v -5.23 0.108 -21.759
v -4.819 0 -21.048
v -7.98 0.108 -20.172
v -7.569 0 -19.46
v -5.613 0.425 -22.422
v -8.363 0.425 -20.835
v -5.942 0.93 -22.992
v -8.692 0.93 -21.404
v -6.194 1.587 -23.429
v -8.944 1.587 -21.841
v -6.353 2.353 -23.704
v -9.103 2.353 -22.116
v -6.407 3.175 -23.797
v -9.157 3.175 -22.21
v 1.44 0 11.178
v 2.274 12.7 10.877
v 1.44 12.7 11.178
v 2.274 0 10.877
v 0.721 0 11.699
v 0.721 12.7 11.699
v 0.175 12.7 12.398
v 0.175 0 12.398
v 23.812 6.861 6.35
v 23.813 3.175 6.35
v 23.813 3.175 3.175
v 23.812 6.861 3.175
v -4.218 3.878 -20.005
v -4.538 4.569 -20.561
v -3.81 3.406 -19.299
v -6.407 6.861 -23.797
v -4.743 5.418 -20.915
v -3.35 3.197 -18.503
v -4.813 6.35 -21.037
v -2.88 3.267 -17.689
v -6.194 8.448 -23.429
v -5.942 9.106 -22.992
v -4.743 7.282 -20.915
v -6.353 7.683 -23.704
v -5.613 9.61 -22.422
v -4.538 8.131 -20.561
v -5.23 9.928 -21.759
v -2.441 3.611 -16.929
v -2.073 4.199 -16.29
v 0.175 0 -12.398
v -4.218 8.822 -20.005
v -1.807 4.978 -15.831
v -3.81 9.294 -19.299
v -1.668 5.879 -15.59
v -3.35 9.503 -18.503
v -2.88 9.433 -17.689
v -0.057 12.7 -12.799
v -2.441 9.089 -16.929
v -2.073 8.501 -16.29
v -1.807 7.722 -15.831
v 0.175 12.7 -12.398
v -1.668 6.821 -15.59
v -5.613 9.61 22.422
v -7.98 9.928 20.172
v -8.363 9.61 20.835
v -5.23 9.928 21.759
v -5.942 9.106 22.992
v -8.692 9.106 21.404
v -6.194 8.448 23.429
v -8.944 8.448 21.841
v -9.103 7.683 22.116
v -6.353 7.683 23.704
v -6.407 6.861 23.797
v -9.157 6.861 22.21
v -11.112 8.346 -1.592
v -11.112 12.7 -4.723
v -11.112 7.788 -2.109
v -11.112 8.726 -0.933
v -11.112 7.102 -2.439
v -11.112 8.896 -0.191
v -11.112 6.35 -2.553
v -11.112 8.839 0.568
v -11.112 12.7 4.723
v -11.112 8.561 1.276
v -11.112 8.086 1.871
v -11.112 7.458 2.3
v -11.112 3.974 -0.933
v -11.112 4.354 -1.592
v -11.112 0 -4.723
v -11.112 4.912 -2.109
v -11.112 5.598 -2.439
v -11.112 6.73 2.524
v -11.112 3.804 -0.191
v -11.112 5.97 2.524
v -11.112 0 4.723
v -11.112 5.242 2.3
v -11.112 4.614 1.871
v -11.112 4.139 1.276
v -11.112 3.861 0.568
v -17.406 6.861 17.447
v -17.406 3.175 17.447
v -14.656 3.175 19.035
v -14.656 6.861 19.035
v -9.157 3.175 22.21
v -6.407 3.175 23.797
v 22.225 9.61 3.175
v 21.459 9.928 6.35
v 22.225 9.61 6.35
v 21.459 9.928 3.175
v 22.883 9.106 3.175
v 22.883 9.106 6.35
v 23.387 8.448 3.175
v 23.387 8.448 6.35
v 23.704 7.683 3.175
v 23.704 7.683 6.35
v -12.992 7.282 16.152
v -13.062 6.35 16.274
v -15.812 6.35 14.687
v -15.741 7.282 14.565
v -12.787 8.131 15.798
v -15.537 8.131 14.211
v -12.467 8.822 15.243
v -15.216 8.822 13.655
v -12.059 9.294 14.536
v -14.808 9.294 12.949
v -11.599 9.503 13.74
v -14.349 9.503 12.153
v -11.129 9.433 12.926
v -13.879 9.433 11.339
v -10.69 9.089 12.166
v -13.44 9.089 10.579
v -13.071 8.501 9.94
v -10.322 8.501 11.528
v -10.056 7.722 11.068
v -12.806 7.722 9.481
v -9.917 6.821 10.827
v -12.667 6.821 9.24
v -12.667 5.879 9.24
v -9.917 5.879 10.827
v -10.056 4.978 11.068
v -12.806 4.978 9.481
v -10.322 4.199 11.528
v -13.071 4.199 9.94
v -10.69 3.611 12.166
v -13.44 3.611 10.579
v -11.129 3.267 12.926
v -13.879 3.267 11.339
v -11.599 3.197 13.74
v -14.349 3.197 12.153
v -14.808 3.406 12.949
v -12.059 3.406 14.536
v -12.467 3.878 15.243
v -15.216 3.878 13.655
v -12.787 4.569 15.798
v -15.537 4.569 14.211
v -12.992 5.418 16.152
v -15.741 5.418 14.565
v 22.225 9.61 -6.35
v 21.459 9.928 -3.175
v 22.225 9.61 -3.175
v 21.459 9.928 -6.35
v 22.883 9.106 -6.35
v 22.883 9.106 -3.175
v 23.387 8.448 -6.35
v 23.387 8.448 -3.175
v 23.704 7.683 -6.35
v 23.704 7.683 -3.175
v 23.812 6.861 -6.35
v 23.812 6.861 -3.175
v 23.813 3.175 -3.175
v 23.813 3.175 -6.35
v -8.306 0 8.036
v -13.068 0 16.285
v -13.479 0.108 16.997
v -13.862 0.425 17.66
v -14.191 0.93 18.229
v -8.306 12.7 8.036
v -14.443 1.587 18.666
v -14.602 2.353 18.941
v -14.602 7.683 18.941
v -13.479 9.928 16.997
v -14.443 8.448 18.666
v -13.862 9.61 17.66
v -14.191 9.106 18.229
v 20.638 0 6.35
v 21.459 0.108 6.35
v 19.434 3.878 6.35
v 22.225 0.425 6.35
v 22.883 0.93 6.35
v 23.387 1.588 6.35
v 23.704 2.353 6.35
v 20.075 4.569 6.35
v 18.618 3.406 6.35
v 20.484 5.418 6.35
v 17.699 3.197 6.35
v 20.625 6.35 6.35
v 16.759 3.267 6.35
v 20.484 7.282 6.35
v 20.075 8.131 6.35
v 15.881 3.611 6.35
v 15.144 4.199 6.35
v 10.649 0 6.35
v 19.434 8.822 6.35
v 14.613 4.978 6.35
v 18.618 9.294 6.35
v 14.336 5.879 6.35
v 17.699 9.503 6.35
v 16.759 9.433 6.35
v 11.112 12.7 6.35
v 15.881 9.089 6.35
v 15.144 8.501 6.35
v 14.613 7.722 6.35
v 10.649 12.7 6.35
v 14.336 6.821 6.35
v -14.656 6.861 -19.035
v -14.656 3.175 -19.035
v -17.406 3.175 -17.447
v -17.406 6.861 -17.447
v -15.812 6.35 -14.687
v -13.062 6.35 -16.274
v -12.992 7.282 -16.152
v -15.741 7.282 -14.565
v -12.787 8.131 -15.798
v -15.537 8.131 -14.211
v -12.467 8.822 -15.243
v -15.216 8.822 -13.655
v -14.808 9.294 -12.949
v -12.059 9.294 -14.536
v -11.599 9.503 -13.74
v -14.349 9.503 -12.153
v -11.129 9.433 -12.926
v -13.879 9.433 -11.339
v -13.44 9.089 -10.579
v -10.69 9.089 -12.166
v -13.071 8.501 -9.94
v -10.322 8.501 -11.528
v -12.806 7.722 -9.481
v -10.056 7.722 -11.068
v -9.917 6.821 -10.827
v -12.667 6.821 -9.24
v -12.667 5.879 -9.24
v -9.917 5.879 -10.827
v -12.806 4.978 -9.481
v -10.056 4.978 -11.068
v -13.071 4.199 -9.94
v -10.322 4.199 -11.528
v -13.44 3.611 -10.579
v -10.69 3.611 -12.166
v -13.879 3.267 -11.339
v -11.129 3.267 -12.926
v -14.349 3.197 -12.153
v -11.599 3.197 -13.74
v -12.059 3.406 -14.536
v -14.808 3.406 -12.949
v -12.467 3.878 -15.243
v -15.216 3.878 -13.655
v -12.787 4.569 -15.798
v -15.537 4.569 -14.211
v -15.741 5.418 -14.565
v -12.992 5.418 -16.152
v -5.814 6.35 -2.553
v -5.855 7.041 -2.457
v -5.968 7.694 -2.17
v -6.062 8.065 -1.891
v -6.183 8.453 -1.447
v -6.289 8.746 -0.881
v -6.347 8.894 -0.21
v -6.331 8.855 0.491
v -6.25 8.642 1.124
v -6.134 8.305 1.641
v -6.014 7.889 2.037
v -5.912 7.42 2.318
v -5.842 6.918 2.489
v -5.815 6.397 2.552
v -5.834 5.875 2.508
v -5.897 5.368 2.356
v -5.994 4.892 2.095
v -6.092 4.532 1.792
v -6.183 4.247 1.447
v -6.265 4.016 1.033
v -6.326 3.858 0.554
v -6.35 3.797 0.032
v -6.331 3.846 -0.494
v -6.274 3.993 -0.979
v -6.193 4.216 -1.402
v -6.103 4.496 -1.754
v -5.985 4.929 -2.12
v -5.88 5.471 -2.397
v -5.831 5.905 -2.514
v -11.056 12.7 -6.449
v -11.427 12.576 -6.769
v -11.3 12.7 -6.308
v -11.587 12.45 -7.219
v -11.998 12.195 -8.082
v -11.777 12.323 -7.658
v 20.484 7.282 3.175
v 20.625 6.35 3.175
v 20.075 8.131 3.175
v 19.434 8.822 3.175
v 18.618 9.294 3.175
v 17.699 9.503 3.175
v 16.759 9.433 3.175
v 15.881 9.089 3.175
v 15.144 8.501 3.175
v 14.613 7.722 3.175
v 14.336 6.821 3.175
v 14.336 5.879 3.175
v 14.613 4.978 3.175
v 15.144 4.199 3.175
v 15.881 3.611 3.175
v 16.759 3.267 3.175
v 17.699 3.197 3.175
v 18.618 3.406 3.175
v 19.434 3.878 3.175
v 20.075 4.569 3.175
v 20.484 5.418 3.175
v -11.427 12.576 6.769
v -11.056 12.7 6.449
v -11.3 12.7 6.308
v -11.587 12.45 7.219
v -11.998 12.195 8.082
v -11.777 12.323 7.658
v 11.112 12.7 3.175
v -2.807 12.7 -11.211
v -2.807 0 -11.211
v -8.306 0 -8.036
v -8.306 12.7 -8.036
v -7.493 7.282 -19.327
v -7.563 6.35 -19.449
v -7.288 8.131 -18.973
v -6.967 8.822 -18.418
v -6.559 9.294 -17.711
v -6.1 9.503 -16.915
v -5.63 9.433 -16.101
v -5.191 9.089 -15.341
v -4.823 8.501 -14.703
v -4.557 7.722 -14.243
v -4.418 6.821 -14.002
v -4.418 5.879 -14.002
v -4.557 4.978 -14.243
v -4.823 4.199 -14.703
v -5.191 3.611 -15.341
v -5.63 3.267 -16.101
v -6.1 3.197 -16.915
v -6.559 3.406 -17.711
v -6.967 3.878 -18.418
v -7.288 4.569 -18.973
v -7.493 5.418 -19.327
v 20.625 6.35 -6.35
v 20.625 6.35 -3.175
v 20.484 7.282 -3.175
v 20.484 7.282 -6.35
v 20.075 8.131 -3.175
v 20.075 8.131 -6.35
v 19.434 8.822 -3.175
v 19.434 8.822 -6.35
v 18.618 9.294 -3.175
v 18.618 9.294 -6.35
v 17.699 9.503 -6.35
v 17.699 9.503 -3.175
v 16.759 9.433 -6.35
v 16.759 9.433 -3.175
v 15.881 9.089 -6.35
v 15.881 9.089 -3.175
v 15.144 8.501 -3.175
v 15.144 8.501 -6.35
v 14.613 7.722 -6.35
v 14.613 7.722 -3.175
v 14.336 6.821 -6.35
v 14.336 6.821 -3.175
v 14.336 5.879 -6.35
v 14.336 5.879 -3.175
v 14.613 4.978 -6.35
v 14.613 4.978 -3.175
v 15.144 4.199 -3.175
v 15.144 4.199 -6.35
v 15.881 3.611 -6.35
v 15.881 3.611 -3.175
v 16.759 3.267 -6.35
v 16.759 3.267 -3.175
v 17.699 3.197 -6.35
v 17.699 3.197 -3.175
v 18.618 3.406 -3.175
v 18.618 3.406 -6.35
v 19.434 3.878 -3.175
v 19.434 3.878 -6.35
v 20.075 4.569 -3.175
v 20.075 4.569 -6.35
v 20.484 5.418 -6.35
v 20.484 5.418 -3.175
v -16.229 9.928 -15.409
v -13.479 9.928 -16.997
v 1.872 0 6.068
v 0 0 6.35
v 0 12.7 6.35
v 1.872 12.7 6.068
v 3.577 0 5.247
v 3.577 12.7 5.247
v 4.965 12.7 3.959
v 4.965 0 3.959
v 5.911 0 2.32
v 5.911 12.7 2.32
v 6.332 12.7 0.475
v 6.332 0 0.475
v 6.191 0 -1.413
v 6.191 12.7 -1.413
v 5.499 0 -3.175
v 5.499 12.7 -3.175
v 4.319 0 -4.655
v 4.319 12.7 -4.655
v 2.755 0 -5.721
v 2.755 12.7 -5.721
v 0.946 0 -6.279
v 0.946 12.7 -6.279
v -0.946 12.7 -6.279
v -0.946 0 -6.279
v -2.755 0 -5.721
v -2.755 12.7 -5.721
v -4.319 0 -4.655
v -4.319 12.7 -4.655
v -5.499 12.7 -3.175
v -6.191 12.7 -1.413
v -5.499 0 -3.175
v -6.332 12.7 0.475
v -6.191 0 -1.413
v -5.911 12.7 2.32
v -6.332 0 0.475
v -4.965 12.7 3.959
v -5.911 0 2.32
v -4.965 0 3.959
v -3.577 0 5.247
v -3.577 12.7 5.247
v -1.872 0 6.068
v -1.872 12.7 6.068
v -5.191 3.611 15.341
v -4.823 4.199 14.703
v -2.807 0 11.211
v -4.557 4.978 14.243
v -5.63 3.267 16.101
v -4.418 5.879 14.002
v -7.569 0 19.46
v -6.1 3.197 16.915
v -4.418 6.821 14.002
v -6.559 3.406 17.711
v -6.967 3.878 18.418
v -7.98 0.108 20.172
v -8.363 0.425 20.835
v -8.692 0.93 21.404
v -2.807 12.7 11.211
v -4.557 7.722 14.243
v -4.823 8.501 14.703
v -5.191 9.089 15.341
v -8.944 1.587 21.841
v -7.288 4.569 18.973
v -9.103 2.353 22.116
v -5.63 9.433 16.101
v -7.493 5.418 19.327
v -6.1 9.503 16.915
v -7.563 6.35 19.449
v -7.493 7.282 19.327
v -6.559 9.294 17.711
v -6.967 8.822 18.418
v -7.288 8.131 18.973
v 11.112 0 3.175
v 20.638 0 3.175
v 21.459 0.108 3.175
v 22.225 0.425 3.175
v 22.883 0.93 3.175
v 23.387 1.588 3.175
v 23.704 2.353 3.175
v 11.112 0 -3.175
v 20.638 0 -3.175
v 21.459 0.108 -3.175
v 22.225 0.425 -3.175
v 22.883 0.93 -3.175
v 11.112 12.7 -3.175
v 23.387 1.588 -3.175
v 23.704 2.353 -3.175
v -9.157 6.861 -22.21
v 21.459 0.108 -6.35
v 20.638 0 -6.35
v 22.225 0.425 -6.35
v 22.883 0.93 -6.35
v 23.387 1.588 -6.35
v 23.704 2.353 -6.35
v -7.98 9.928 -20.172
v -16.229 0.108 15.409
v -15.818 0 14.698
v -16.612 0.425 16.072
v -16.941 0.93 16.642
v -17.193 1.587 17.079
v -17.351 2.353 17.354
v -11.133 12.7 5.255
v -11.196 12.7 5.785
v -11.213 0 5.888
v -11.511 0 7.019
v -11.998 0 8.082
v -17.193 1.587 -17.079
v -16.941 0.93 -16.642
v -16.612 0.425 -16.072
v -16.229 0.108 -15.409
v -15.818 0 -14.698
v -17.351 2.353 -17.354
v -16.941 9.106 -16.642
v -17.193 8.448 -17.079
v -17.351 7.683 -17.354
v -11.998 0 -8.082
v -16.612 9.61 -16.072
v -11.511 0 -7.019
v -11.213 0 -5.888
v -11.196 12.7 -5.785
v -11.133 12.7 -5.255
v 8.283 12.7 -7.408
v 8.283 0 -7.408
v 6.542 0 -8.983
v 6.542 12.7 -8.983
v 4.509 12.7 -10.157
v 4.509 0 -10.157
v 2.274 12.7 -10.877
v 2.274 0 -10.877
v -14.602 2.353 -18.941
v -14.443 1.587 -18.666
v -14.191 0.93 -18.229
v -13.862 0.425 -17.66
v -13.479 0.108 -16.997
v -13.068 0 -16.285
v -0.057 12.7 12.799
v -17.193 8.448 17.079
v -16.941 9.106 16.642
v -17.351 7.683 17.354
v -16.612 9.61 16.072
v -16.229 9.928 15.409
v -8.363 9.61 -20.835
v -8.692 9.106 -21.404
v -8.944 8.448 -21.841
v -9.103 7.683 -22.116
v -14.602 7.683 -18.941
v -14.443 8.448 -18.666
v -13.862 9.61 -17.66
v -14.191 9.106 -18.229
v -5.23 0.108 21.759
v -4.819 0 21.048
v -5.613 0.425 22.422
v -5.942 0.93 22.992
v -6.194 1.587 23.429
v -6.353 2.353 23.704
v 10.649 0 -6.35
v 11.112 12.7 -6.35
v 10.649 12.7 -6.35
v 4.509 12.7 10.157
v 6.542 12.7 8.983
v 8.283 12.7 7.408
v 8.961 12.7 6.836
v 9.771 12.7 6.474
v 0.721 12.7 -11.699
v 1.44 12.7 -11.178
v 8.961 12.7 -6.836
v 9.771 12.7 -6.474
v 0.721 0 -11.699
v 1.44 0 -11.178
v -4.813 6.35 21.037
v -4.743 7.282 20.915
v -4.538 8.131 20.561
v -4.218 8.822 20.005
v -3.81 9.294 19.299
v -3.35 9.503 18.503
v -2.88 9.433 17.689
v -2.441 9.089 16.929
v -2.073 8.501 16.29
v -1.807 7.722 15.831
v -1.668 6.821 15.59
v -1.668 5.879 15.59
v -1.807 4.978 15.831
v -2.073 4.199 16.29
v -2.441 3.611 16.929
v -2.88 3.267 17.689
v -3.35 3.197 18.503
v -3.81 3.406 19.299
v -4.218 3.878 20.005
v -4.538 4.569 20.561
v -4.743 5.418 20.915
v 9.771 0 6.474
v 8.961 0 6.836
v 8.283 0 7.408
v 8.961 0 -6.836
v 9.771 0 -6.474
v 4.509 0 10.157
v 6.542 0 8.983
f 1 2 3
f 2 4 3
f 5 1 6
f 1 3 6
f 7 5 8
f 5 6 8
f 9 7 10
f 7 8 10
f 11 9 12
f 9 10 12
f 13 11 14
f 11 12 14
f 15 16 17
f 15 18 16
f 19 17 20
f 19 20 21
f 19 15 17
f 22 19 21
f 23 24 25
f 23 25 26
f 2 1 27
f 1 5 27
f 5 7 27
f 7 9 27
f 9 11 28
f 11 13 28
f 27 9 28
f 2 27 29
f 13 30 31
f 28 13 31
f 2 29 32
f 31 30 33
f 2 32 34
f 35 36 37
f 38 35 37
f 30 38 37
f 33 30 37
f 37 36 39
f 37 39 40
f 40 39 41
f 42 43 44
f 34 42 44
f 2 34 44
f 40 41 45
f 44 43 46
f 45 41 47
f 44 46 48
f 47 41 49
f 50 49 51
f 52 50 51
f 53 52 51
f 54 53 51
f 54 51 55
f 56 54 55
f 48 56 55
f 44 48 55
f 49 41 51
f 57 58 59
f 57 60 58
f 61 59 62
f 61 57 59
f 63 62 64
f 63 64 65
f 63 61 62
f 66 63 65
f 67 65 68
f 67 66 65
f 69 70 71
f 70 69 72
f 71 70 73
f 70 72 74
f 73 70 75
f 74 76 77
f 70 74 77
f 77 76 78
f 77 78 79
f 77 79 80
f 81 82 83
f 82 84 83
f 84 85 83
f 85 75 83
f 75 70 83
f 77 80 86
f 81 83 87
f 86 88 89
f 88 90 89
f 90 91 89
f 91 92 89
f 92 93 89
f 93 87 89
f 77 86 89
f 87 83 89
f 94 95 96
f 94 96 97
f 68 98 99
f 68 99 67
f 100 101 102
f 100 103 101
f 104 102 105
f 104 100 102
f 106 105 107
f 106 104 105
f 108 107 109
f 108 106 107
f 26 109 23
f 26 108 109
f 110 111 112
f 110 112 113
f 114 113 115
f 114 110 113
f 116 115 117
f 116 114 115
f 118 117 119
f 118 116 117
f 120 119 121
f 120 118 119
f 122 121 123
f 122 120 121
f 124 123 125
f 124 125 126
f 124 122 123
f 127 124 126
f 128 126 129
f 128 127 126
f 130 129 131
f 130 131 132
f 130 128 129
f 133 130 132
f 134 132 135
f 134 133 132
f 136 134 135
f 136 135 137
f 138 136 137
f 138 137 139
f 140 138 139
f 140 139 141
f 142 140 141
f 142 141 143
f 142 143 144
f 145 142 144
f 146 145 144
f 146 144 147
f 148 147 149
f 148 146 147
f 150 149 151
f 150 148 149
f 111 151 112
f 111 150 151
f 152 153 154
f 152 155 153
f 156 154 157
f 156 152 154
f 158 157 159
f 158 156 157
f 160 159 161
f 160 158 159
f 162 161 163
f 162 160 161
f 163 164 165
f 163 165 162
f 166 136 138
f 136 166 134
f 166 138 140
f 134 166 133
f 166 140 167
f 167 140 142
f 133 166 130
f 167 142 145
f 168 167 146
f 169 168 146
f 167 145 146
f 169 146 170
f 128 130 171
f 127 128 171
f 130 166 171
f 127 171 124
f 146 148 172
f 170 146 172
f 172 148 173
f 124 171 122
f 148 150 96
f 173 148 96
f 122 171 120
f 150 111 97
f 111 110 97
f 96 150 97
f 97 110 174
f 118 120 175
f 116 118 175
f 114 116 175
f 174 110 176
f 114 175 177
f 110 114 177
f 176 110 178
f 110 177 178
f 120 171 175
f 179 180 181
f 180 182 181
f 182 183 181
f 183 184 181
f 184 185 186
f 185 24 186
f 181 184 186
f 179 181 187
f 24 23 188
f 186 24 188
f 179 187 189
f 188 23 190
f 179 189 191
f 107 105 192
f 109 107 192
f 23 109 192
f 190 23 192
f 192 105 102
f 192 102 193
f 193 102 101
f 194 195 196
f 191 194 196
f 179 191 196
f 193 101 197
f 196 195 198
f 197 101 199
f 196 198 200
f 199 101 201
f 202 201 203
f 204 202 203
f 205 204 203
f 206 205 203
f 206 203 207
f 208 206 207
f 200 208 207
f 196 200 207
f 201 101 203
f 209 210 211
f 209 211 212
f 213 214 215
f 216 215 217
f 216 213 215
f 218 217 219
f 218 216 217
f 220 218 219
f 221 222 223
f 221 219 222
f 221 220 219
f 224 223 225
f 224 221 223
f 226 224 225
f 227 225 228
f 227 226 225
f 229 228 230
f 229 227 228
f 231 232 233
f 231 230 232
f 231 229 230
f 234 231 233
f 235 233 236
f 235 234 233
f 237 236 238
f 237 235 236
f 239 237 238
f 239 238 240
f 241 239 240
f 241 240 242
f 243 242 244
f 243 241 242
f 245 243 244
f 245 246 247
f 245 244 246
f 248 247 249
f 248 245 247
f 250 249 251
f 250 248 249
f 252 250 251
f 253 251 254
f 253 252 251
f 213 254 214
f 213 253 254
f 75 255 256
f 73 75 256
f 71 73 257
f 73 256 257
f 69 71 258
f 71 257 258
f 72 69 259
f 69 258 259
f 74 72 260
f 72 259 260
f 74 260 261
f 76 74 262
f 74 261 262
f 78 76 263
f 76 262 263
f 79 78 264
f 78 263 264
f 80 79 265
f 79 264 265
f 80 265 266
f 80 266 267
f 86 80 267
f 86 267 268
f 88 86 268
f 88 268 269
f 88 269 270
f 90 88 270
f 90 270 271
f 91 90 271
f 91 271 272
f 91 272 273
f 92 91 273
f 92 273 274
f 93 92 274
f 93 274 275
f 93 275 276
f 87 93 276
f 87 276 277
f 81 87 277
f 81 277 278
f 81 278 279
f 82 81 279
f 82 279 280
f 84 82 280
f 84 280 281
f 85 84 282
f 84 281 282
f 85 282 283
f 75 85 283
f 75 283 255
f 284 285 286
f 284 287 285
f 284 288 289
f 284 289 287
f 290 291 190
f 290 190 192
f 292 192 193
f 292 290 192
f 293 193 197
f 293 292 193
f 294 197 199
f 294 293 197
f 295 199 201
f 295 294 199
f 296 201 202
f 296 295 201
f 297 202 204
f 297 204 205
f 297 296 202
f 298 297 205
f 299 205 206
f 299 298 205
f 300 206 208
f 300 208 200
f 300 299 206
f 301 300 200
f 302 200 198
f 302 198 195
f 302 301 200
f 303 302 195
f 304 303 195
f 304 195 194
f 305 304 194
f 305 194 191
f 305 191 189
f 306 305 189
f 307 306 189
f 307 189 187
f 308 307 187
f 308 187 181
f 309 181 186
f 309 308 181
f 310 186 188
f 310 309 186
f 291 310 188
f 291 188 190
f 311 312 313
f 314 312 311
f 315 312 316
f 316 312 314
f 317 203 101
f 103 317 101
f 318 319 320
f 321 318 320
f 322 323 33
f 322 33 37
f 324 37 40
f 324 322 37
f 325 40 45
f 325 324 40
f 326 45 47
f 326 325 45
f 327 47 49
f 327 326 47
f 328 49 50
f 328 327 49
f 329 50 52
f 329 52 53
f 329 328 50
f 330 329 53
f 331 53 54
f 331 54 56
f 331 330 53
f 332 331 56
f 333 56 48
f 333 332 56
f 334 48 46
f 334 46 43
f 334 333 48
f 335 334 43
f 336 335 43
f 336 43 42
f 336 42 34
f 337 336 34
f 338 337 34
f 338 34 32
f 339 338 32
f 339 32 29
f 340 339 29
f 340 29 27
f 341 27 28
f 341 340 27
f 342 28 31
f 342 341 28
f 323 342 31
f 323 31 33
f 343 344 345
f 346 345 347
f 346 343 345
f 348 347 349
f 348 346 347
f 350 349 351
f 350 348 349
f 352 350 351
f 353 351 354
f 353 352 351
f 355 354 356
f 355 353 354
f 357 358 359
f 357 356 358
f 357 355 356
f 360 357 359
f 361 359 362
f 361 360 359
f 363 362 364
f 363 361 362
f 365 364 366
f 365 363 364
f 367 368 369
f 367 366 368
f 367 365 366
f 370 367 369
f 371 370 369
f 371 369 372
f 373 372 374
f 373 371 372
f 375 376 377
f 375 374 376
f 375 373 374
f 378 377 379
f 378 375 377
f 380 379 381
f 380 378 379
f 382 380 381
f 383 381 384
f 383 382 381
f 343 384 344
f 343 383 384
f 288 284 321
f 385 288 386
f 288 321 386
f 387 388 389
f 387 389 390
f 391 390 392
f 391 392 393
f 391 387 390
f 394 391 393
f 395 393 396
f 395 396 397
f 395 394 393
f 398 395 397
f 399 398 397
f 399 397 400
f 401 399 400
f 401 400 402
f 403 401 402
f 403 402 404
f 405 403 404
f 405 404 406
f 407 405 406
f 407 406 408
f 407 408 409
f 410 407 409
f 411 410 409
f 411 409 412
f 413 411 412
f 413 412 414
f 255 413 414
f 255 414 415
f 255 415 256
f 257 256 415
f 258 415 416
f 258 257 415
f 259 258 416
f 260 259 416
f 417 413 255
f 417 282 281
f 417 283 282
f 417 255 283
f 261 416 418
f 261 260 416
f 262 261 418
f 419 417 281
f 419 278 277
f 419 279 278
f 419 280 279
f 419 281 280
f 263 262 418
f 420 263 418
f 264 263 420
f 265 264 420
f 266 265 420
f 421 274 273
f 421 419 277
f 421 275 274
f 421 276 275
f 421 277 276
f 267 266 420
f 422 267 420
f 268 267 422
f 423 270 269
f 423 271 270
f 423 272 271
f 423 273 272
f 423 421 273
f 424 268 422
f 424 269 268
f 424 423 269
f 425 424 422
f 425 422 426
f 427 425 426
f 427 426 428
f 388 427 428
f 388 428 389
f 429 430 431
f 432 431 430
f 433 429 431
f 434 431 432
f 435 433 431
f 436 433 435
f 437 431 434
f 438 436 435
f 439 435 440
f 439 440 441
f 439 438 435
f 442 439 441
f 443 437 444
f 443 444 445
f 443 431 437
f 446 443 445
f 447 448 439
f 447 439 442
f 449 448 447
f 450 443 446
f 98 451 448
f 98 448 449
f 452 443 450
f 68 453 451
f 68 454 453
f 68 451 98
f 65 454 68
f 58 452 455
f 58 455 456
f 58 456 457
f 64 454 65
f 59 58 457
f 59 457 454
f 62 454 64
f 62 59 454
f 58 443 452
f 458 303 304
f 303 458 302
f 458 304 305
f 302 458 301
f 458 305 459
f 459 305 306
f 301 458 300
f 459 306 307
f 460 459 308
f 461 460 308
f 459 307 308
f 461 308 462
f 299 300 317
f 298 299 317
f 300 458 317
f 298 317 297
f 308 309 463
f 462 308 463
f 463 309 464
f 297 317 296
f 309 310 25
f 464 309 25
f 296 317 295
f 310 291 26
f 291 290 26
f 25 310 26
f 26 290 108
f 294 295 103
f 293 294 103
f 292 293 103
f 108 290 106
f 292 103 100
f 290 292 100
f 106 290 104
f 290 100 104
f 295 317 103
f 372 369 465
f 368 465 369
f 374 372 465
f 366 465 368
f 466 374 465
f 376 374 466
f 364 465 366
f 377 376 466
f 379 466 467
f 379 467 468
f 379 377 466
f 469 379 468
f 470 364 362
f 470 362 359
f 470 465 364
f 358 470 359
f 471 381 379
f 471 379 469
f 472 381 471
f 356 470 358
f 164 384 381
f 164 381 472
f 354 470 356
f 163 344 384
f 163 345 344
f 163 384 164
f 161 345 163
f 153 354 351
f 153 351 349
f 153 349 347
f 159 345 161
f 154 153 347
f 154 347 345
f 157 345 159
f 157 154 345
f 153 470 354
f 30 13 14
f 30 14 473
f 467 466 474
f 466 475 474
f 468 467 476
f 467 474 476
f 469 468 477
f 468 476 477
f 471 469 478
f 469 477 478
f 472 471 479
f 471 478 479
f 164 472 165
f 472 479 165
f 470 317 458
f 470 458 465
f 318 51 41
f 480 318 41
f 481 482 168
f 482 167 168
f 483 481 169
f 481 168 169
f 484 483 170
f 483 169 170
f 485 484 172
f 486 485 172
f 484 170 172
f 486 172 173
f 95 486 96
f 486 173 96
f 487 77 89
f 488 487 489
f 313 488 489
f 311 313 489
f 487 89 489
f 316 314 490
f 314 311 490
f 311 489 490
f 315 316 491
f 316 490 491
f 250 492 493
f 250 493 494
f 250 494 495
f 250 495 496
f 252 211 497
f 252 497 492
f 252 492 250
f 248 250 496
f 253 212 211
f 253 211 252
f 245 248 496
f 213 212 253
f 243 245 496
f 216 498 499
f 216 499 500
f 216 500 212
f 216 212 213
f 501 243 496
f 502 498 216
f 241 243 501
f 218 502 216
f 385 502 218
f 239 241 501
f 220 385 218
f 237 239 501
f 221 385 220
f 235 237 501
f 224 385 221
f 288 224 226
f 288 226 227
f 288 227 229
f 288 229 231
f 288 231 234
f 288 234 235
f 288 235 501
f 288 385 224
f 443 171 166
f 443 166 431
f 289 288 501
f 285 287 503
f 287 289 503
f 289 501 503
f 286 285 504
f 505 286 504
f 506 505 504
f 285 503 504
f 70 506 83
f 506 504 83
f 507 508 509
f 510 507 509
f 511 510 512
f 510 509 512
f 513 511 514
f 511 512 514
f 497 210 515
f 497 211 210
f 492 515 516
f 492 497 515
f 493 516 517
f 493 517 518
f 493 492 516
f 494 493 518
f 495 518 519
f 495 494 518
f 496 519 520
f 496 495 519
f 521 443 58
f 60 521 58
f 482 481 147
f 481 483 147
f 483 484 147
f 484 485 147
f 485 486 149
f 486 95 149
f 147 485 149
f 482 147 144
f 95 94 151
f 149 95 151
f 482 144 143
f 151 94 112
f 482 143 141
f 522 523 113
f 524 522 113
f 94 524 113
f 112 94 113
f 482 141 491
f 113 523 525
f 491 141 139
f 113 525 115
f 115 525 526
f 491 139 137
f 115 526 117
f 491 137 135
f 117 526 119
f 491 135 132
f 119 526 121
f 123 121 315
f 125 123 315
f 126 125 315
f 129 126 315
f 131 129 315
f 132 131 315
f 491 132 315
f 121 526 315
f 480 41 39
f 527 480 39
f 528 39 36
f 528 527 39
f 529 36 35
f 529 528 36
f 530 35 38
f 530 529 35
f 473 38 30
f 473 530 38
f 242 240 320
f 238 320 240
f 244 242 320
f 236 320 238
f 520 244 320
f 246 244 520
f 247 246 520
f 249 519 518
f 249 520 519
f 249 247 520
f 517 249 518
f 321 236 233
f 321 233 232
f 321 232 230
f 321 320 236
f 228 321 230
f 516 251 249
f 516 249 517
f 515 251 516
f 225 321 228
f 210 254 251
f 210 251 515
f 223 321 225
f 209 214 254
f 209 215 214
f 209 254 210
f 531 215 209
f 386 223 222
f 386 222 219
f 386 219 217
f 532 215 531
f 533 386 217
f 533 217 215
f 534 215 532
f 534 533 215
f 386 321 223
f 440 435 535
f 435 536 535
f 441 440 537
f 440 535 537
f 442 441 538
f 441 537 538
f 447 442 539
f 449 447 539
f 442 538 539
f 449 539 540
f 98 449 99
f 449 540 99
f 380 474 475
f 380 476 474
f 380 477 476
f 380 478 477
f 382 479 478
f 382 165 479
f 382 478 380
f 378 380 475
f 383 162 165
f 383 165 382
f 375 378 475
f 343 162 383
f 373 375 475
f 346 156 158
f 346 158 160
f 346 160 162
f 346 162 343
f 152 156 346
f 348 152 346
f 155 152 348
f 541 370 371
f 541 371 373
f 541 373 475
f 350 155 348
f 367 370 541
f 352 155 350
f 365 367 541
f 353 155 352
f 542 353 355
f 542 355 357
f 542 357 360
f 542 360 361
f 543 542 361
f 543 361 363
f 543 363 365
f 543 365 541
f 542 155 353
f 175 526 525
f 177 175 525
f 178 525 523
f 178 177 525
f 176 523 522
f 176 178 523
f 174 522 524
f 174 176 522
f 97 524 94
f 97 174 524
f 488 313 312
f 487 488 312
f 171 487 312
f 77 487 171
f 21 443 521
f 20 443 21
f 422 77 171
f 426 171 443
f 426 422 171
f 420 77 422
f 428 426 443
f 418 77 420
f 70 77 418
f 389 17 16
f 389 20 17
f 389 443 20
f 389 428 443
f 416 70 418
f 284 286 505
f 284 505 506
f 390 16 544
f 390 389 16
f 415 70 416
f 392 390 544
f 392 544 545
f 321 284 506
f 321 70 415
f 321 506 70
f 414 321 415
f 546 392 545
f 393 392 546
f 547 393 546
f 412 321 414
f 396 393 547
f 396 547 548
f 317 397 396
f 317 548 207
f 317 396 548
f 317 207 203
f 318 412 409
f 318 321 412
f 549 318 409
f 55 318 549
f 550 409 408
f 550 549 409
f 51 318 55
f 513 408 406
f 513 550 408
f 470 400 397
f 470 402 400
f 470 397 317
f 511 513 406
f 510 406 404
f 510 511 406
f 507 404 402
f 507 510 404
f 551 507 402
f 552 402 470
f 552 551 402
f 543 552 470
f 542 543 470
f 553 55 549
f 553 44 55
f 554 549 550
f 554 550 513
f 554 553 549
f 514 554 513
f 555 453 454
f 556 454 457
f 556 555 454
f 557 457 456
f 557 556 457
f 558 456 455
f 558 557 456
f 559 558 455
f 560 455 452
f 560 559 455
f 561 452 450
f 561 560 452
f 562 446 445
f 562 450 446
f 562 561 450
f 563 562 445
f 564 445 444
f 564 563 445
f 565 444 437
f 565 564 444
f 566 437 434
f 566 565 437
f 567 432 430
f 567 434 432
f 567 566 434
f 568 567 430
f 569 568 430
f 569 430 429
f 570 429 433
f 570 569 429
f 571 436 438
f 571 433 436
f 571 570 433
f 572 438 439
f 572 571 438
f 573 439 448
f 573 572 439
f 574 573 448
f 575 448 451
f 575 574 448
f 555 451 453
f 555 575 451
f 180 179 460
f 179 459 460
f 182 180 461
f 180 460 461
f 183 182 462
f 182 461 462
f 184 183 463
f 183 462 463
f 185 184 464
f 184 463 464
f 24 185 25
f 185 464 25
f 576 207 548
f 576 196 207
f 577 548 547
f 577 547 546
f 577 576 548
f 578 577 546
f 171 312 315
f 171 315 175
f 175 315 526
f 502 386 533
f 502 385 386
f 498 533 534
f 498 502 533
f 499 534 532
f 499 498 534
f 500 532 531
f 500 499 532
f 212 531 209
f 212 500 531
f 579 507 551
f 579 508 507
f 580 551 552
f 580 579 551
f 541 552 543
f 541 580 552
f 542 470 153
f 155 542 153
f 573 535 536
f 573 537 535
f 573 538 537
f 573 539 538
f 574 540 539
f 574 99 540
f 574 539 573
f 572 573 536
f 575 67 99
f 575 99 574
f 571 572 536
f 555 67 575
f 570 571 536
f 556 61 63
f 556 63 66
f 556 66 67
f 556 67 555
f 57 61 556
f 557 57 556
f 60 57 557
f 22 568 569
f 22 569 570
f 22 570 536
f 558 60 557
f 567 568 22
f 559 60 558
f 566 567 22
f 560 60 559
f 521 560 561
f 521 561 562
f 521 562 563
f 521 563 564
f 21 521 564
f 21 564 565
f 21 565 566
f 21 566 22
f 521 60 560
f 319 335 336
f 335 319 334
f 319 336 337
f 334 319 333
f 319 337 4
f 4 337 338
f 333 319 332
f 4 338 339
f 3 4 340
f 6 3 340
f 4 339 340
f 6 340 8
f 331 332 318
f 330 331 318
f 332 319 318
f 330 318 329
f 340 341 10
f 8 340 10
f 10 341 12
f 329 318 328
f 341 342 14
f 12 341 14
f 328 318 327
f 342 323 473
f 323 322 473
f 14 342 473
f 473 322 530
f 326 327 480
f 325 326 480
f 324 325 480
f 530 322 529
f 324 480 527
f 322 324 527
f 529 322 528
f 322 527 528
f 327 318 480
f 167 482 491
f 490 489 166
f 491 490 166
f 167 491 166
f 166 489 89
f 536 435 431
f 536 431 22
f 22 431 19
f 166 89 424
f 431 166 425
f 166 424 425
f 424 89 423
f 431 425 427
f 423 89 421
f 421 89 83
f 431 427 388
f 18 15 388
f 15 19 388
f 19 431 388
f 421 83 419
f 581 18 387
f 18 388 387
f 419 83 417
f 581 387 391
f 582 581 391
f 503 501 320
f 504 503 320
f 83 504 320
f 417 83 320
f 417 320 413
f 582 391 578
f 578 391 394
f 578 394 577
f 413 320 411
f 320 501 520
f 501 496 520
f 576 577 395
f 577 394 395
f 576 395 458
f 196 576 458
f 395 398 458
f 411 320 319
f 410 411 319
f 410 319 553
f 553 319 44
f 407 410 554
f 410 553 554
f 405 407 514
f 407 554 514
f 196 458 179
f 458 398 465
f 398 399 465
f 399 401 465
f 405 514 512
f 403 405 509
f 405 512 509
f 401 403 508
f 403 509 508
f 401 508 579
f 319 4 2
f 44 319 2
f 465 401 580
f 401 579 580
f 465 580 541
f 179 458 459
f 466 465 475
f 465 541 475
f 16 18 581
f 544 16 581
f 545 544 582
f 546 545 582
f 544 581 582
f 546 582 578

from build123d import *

# Parameters (mm, degrees)
SKETCH1_R                             = 11.1125
SKETCH1_R_2                           = 6.35
BOSS_EXTRUDE1_DEPTH                   = 12.7
SKETCH4_R                             = 3.1623
BOSS_EXTRUDE2_DEPTH                   = 6.35
SKETCH5_W                             = 12.7
SKETCH5_H                             = 6.35
CUT_EXTRUDE1_DEPTH                    = 30.185832393
CIRPATTERN1_COUNT                     = 3
FILLET2_R                             = 3.175
BOSS_EXTRUDE3_START                   = -12.7
BOSS_EXTRUDE3_DEPTH                   = 12.7
CUT_EXTRUDE2_REACH                    = 43.809
CUT_EXTRUDE3_DEPTH                    = 42.808737587
CUT_EXTRUDE3_DEPTH_BACK               = 42.808737587
TAPPED_HOLE_FOR_10_32_HELICOIL1_D     = 5.1054
TAPPED_HOLE_FOR_10_32_HELICOIL1_DEPTH = 11.9888
TAPPED_HOLE_FOR_10_32_HELICOIL1_TIP   = 1.533816902


# Read off the part's stored shape, not the designer's step: Boss-Extrude3
with BuildPart() as part:
    # Sketch1 → Boss-Extrude1 (new body)
    with BuildSketch(Plane(origin=(0, 0, 0), x_dir=(1, 0, 0), z_dir=(0, 1, 0))):
        with Locations(Location((0, 0, 0), (0, 0, 270))):
            Circle(SKETCH1_R)
        with Locations(Location((0, 0, 0), (0, 0, 270))):
            Circle(SKETCH1_R_2, mode=Mode.SUBTRACT)
    extrude(amount=BOSS_EXTRUDE1_DEPTH)

    # Sketch4 → Boss-Extrude2 (add, symmetric)
    with BuildSketch(Plane.XY):
        Polygon((11.1125, 12.7), (23.8125, 9.297045256), (23.8125, 3.402954744), (23.8125, 0), (11.1125, 0), (8.73125, 0), (8.73125, 12.7), align=None)
        with Locations((17.4625, 6.35)):
            Circle(SKETCH4_R, mode=Mode.SUBTRACT)
    boss_extrude2 = extrude(amount=BOSS_EXTRUDE2_DEPTH, both=True)

    # Sketch5 → Cut-Extrude1 (cut, through all)
    with BuildSketch(Plane(origin=(0, 12.7, 0), x_dir=(1, 0, 0), z_dir=(0, 1, 0))):
        with Locations((17.4625, 0)):
            Rectangle(SKETCH5_W, SKETCH5_H)
    cut_extrude1 = extrude(amount=-CUT_EXTRUDE1_DEPTH, mode=Mode.SUBTRACT)

    # CirPattern1: Boss-Extrude2, Cut-Extrude1 ×3 about axis
    cirpattern1_axis = Axis((0, 0, 0), (0, 1, 0))
    add([boss_extrude2.rotate(cirpattern1_axis, i * 360 / CIRPATTERN1_COUNT) for i in range(1, CIRPATTERN1_COUNT)])
    add([cut_extrude1.rotate(cirpattern1_axis, i * 360 / CIRPATTERN1_COUNT) for i in range(1, CIRPATTERN1_COUNT)], mode=Mode.SUBTRACT)

    # Fillet2
    fillet2_edges = [part.edges().sort_by_distance(p)[0] for p in [
        (9.119493201, 6.35, -6.35),
        (9.119493201, 6.35, 6.35),
        (-16.030695986, 9.297045256, -18.240979928),
        (-16.030695986, 0, -18.240979928),
        (-7.781804014, 9.297045256, 23.003479928),
        (-7.781804014, 0, 23.003479928),
        (23.8125, 9.297045256, 4.7625),
        (23.8125, 0, 4.7625),
        (23.8125, 9.297045256, -4.7625),
        (23.8125, 0, -4.7625),
        (0.939514713, 6.35, 11.072712782),
        (-16.030695986, 9.297045256, 18.240979928),
        (-16.030695986, 0, 18.240979928),
        (0.939514713, 6.35, -11.072712782),
        (-7.781804014, 9.297045256, -23.003479928),
        (-7.781804014, 0, -23.003479928),
    ]]
    fillet(fillet2_edges, radius=FILLET2_R)

    # Boss-Extrude3 outline → Boss-Extrude3 (add)
    with BuildSketch(Plane(origin=(0, 12.7, 0), x_dir=(1, 0, 0), z_dir=(0, 1, 0)).offset(BOSS_EXTRUDE3_START)):
        with BuildLine():
            ThreePointArc((-10.059007915, -4.722712782), (-10.845929691, -2.419393601), (-11.1125, 0))
            Line((-11.1125, 0), (-11.1125, -4.722712782))
            ThreePointArc((-11.1125, -4.722712782), (-11.337716442, -6.459773203), (-11.99847248, -8.081963948))
            Line((-11.99847248, -8.081963948), (-11.055511314, -6.4487073))
            Line((-11.055511314, -6.4487073), (-10.059007915, -4.722712782))
        make_face()
        with BuildLine():
            Line((-11.055511314, 6.4487073), (-11.99847248, 8.081963948))
            ThreePointArc((-11.99847248, 8.081963948), (-11.337716442, 6.459773203), (-11.1125, 4.722712782))
            Line((-11.1125, 4.722712782), (-11.1125, 0))
            ThreePointArc((-11.1125, 0), (-10.845929691, 2.419393601), (-10.059007915, 4.722712782))
            Line((-10.059007915, 4.722712782), (-11.055511314, 6.4487073))
        make_face()
    extrude(amount=BOSS_EXTRUDE3_DEPTH)

    # Sketch9 → Cut-Extrude2 (cut, up to next)
    with BuildSketch(Plane(origin=(-5.499261314, 0, -3.175), x_dir=(-0.500000000000004, 0, 0.8660254037844364), z_dir=(-0.8660254037844365, 0, -0.500000000000004)), mode=Mode.PRIVATE) as cut_extrude2_sk1:
        Polygon((11.1125, 12.7), (12.998422331, 12.194668634), (12.998422331, 12.7), align=None)
    cut_extrude2_tool1 = extrude(cut_extrude2_sk1.sketch, amount=CUT_EXTRUDE2_REACH, mode=Mode.PRIVATE) & part.part
    add(cut_extrude2_tool1.solids().sort_by_distance((-11.684152, 12.531556, 7.537545))[0], mode=Mode.SUBTRACT)

    # Sketch10 → Cut-Extrude3 (cut, two sides: drawn at the far end of the back side and taken through both)
    with BuildSketch(Plane(origin=(-5.499261314, 0, 3.175), x_dir=(0.49999999999999195, 0, 0.8660254037844434), z_dir=(-0.8660254037844434, 0, 0.49999999999999195)).offset(-CUT_EXTRUDE3_DEPTH_BACK)):
        Polygon((-12.998422331, 117.204706423), (-12.998422331, 12.7), (-12.998422331, 12.194668634), (-11.1125, 12.7), (89.831294903, 39.747808325), (215.584349787, 206.694218426), (112.754632553, 284.151116524), align=None)
    extrude(amount=CUT_EXTRUDE3_DEPTH + CUT_EXTRUDE3_DEPTH_BACK, mode=Mode.SUBTRACT)

    # Tapped Hole for #10-32 Helicoil1
    with Locations(Plane.ZY.offset(11.1125)):
        with Locations((0, 6.35)):
            Hole(TAPPED_HOLE_FOR_10_32_HELICOIL1_D / 2, depth=TAPPED_HOLE_FOR_10_32_HELICOIL1_DEPTH)
            with Locations((0, 0, -(TAPPED_HOLE_FOR_10_32_HELICOIL1_DEPTH + TAPPED_HOLE_FOR_10_32_HELICOIL1_TIP / 2))):  # 118° drill point
                Cone(0, TAPPED_HOLE_FOR_10_32_HELICOIL1_D / 2, TAPPED_HOLE_FOR_10_32_HELICOIL1_TIP, mode=Mode.SUBTRACT)


solid = part.part
